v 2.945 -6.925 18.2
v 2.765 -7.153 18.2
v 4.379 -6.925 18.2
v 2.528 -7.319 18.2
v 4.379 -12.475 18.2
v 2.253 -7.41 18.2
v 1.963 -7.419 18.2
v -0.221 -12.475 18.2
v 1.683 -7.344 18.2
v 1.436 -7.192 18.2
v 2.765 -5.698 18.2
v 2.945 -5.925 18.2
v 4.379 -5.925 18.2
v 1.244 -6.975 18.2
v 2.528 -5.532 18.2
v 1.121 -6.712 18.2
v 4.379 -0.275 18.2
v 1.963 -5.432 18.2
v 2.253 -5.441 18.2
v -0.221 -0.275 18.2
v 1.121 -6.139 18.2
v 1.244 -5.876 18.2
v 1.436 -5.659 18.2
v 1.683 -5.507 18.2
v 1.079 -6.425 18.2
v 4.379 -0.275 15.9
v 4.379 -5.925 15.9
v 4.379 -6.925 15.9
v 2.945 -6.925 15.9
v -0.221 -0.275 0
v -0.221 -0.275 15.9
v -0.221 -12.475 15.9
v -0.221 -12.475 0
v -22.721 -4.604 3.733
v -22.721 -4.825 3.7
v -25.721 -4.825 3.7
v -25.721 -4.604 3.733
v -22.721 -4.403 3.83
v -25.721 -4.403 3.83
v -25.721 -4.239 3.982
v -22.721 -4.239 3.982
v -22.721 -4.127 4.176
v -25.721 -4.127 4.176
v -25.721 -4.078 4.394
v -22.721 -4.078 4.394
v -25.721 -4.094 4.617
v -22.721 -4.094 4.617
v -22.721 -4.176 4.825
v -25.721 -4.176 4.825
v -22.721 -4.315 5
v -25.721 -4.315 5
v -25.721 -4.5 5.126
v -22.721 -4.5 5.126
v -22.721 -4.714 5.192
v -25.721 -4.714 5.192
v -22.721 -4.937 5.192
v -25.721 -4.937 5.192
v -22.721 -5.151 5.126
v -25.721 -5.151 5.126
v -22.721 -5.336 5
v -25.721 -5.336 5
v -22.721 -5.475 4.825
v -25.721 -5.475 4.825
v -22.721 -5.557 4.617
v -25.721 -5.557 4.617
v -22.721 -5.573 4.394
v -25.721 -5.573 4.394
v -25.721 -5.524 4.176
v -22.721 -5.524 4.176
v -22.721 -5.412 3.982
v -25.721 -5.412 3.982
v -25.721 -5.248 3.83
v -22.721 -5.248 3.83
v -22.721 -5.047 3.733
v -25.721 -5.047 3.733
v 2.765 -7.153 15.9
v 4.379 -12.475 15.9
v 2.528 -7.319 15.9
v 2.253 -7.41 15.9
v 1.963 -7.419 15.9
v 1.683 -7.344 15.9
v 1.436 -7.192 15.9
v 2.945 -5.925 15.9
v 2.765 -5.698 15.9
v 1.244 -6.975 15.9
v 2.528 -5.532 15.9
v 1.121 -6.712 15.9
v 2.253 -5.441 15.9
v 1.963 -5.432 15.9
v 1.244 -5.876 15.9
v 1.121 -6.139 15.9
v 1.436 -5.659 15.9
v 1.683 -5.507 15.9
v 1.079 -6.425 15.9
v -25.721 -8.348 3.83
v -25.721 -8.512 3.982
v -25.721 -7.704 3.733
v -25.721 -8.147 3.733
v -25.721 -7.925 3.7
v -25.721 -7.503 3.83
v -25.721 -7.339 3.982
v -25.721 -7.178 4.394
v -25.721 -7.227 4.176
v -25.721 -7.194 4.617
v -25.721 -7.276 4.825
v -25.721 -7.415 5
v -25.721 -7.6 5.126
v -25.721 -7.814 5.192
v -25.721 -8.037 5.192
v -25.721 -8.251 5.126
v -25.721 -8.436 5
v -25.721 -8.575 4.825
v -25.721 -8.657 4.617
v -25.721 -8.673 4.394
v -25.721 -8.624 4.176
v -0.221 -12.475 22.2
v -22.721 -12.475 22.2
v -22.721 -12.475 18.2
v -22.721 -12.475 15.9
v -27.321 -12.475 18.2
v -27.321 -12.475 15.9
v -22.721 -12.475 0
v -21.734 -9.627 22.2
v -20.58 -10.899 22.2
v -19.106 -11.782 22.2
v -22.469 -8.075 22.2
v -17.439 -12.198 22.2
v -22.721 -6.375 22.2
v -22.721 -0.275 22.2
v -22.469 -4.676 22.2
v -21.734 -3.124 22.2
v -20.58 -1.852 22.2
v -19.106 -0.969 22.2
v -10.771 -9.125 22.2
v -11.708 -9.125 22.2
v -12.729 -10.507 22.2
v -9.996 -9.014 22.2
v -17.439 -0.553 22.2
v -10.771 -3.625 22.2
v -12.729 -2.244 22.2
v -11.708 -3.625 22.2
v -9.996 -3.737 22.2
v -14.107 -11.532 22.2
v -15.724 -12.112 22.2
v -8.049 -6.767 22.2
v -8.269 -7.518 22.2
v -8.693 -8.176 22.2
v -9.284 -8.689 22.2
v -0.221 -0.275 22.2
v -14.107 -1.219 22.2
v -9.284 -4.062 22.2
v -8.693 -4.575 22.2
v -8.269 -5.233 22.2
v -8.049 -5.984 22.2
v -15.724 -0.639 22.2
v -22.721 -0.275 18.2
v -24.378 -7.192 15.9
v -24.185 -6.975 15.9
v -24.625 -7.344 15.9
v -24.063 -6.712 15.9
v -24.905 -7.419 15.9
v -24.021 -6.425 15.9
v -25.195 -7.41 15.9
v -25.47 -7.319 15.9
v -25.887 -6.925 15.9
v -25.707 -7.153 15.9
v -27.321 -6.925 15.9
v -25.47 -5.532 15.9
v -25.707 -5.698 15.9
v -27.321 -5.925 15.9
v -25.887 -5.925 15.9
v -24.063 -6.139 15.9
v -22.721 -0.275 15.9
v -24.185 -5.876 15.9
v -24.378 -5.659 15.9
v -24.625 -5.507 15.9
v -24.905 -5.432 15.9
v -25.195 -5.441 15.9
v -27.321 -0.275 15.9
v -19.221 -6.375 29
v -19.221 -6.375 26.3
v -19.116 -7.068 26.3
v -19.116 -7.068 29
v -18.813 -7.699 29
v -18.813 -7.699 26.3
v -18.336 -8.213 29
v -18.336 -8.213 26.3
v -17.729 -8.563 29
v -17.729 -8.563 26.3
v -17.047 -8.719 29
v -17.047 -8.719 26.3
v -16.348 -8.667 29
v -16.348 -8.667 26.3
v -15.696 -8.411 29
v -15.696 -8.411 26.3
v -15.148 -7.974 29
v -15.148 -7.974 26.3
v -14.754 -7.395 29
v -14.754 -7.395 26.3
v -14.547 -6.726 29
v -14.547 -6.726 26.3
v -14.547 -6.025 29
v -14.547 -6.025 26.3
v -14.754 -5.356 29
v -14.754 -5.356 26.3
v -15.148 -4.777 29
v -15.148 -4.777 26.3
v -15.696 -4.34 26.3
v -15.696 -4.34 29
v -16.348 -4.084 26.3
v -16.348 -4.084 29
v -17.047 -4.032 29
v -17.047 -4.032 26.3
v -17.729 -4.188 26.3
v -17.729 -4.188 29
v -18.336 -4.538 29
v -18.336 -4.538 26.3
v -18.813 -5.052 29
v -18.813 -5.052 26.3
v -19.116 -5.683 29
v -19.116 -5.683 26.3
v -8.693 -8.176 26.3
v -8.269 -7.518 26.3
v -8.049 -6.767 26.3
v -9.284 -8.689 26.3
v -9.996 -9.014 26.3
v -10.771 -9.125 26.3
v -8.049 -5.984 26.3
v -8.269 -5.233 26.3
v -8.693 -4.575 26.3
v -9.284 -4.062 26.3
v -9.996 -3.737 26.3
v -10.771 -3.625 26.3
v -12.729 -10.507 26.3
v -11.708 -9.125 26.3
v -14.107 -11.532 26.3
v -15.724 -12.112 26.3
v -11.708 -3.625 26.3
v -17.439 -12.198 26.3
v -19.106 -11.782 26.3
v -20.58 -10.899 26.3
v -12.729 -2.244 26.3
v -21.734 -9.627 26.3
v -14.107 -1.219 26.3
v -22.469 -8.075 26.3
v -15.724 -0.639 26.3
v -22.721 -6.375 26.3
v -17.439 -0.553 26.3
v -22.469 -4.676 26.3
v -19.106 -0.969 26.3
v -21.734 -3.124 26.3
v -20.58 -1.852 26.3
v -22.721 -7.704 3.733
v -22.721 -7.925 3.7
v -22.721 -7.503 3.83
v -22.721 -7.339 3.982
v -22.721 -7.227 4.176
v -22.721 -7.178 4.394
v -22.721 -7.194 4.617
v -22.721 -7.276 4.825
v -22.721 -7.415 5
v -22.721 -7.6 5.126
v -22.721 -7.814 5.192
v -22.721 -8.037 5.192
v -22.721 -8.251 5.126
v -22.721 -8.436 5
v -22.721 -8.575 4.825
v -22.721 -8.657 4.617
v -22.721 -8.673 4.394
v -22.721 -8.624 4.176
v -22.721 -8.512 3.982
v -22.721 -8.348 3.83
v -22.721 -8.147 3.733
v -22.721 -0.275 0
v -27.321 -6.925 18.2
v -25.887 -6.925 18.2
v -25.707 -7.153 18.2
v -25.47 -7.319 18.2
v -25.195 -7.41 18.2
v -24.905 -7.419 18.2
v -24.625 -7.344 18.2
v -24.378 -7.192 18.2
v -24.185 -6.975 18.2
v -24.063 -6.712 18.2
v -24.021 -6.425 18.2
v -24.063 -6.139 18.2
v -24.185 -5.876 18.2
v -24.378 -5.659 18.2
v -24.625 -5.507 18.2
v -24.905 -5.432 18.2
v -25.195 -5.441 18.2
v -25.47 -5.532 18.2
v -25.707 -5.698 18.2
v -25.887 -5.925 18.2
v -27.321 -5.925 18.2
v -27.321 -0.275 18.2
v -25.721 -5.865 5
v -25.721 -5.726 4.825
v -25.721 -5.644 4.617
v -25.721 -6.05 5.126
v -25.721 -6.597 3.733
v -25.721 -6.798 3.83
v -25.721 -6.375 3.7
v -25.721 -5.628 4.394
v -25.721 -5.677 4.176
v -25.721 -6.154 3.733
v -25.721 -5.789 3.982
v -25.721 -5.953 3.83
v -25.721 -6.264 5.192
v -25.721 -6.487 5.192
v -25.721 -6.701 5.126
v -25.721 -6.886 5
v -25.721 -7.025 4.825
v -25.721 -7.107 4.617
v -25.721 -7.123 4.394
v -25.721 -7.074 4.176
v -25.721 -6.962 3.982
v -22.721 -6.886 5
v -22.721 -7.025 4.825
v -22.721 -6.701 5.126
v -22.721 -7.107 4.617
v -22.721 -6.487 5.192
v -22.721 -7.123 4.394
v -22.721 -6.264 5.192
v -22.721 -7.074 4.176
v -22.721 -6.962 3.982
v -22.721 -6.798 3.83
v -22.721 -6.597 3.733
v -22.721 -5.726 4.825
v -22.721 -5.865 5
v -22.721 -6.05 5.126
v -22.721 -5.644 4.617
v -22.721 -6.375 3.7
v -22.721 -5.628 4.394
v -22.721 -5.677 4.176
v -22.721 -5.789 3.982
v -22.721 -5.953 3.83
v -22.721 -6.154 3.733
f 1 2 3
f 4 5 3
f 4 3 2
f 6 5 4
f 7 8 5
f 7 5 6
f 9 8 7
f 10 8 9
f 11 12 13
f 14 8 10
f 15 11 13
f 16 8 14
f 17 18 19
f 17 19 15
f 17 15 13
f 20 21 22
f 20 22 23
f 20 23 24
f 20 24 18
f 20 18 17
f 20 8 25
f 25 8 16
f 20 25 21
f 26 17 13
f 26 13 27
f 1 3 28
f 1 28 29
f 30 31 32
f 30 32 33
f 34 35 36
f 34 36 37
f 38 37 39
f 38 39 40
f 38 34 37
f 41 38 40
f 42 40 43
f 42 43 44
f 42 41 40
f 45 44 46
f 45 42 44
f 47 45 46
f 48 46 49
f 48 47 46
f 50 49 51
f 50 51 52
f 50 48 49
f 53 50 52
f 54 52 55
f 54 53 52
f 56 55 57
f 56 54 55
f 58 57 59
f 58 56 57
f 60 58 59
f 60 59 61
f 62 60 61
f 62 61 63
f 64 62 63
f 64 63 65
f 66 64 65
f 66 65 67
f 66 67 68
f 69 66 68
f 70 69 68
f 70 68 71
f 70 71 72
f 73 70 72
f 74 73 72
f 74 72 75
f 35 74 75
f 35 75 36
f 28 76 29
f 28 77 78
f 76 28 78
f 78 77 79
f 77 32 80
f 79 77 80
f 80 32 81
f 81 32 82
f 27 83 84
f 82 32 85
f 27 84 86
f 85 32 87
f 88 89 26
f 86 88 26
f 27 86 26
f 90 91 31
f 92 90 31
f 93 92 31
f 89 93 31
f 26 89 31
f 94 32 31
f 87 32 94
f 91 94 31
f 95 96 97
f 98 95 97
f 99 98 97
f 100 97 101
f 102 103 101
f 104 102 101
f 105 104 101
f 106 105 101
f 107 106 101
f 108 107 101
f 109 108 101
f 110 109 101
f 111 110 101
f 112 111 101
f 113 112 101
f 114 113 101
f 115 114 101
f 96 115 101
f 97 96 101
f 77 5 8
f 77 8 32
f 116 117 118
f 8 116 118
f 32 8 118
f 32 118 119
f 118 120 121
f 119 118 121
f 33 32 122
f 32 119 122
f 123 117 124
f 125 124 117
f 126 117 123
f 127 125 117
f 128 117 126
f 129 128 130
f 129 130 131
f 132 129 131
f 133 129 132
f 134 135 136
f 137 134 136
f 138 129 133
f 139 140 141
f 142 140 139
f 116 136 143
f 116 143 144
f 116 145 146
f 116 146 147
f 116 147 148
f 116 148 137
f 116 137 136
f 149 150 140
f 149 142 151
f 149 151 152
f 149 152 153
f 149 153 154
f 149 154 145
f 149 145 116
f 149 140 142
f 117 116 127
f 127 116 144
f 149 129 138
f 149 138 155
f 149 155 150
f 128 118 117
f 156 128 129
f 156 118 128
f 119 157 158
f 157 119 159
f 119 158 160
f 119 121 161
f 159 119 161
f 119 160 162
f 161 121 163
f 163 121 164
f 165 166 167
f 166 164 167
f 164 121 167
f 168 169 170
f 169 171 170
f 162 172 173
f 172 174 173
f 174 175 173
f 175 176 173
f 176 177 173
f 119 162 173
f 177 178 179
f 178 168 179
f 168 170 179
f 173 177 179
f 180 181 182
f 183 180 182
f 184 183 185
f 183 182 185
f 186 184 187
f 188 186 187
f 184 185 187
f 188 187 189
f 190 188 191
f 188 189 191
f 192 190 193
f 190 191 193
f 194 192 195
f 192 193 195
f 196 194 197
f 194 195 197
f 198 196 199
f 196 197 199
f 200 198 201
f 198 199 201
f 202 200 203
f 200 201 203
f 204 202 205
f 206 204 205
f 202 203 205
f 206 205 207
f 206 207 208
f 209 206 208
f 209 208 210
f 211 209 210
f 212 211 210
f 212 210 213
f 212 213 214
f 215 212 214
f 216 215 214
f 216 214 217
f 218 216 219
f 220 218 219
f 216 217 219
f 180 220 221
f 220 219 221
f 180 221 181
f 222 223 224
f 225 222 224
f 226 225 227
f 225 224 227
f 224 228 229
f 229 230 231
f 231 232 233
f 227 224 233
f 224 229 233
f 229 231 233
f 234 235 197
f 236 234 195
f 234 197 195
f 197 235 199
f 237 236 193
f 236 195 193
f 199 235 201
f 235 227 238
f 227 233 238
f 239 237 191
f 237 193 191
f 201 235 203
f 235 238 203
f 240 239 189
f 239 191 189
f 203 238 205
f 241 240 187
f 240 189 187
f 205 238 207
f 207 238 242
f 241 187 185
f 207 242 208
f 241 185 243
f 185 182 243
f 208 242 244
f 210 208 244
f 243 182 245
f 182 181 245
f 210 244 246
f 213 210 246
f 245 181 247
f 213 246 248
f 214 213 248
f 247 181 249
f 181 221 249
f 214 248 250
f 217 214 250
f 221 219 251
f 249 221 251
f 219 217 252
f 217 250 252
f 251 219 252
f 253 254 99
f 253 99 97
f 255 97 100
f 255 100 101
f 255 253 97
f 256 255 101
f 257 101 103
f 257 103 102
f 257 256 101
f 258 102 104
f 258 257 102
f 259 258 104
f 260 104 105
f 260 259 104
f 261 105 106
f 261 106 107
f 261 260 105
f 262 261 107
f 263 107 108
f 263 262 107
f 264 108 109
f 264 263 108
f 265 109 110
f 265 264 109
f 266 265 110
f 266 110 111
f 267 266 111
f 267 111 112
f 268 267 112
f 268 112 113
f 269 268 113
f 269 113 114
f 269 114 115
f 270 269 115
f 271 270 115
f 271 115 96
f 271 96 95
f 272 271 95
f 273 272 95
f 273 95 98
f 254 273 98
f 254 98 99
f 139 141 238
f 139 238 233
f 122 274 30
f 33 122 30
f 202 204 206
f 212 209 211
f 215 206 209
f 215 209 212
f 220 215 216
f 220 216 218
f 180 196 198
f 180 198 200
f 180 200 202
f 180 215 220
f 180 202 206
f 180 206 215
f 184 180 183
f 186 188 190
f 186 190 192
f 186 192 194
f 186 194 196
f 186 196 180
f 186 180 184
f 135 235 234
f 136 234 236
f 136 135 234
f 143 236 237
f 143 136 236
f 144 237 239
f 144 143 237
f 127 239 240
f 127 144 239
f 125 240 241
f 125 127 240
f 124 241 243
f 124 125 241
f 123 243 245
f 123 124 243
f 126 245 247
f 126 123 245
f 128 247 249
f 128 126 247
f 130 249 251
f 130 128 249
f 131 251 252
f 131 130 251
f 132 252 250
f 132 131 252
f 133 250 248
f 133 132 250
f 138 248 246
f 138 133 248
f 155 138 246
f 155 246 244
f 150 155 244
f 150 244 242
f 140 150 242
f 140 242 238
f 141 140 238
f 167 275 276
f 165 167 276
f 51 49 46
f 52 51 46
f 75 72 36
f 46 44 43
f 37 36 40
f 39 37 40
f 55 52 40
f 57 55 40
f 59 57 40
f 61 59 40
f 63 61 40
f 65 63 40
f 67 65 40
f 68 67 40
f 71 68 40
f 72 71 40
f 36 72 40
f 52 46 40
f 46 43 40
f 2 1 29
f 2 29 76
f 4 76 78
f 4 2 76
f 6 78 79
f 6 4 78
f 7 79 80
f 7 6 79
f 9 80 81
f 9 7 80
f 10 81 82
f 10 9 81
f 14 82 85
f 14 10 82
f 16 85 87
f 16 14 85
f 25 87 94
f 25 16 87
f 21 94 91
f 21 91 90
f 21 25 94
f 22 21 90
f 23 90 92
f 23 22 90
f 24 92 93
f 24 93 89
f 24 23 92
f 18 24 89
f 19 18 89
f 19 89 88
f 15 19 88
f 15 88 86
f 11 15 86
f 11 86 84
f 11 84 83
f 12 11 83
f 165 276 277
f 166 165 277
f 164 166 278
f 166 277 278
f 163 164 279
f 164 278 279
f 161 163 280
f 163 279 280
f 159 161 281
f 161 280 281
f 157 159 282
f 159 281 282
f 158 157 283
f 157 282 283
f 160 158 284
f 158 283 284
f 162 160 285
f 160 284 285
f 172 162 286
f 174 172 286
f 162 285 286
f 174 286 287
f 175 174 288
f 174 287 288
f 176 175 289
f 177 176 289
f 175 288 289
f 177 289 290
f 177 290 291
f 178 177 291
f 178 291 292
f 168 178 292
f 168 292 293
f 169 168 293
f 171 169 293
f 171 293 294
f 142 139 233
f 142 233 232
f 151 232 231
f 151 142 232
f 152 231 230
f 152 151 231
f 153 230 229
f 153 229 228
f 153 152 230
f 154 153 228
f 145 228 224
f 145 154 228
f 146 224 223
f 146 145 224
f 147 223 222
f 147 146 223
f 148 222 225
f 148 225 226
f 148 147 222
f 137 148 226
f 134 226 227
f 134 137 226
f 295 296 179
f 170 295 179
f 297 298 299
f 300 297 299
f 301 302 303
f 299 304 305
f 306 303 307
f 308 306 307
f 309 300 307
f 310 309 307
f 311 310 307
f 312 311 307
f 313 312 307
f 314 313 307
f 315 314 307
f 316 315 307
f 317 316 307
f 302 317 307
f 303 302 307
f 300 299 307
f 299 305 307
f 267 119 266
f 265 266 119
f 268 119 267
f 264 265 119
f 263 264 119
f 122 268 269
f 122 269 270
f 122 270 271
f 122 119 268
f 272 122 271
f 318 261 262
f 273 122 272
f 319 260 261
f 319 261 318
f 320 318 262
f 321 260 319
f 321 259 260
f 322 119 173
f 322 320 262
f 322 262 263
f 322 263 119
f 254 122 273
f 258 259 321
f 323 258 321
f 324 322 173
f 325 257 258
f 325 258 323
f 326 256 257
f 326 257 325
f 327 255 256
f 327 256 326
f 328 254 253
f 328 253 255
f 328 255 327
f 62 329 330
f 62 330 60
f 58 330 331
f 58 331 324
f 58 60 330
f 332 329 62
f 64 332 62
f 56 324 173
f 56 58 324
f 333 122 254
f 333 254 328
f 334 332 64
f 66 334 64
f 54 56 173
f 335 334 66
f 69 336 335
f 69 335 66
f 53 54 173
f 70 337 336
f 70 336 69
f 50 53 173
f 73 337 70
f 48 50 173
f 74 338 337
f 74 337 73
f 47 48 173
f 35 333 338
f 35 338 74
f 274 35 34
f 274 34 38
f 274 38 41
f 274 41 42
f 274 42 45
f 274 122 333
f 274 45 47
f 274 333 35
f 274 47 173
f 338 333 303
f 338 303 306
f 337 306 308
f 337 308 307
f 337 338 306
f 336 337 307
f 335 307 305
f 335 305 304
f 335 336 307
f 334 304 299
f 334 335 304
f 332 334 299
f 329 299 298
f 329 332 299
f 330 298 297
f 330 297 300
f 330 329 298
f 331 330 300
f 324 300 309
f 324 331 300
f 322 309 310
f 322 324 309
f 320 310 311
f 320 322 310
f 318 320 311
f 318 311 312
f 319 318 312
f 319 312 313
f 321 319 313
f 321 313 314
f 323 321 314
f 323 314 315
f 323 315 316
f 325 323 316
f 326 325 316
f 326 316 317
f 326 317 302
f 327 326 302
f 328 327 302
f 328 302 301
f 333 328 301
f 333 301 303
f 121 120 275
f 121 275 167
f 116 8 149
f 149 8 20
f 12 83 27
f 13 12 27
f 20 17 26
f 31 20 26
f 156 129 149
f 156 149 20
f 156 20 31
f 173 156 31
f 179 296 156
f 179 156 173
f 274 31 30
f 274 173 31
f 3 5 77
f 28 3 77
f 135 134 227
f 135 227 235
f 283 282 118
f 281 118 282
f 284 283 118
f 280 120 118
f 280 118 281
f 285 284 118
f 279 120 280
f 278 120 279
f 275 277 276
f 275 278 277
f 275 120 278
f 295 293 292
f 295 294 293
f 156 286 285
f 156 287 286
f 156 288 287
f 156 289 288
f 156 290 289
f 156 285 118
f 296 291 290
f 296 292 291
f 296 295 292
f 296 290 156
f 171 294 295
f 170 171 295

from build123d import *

# Parameters (mm, degrees)
SZKIC1_W                         = 22.5
SZKIC1_H                         = 12.2
DODANIE_WYCI_GNI_CIE1_DEPTH      = 22.2
DODANIE_WYCI_GNI_CIE2_DEPTH      = 4.6
DODANIE_WYCI_GNI_CIE2_DEPTH_BACK = 27.1
SZKIC2_W                         = 2.3
SZKIC2_H                         = 12.2
DODANIE_WYCI_GNI_CIE3_DEPTH      = 4.1
SZKIC8_R                         = 2.35
DODANIE_WYCI_GNI_CIE4_DEPTH      = 2.7
WYTNIJ_WYCI_GNI_CIE2_DEPTH       = 2.3
SZKIC11_R                        = 0.75
DODANIE_WYCI_GNI_CIE8_DEPTH      = 25.5


with BuildPart() as part:
    # Szkic1 → Dodanie-wyciągnięcie1 (new body)
    with BuildSketch(Plane.XY):
        with Locations((-11.470890411, -6.375490196)):
            Rectangle(SZKIC1_W, SZKIC1_H)
    extrude(amount=DODANIE_WYCI_GNI_CIE1_DEPTH)

    # Szkic2 → Dodanie-wyciągnięcie2 (add, two sides: drawn at the far end of the back side and taken through both)
    with BuildSketch(Plane(origin=(-0.220890411, 0, 0), x_dir=(0, 0, -1), z_dir=(1, 0, 0)).offset(-DODANIE_WYCI_GNI_CIE2_DEPTH_BACK)):
        with Locations((-17.05, -6.375490196)):
            Rectangle(SZKIC2_W, SZKIC2_H)
    extrude(amount=DODANIE_WYCI_GNI_CIE2_DEPTH + DODANIE_WYCI_GNI_CIE2_DEPTH_BACK)

    # Szkic3 → Dodanie-wyciągnięcie3 (add)
    with BuildSketch(Plane.XY.offset(22.2)):
        with BuildLine():
            Line((-10.770890411, -9.125490196), (-11.707558154, -9.125490196))
            ThreePointArc((-11.707558154, -9.125490196), (-22.720890411, -6.375490196), (-11.707558154, -3.625490196))
            Line((-11.707558154, -3.625490196), (-10.770890411, -3.625490196))
            ThreePointArc((-10.770890411, -3.625490196), (-8.020890411, -6.375490196), (-10.770890411, -9.125490196))
        make_face()
    extrude(amount=DODANIE_WYCI_GNI_CIE3_DEPTH)

    # Szkic8 → Dodanie-wyciągnięcie4 (add)
    with BuildSketch(Plane.XY.offset(26.3)):
        with Locations(Location((-16.870890411, -6.375490196, 0), (0, 0, 180))):
            Circle(SZKIC8_R)
    extrude(amount=DODANIE_WYCI_GNI_CIE4_DEPTH)

    # Szkic10 → Wytnij-wyciągnięcie2 (cut)
    with BuildSketch(Plane.XY.offset(18.2)):
        with BuildLine():
            Line((-27.320890411, -5.925490196), (-27.320890411, -6.925490196))
            Line((-27.320890411, -6.925490196), (-25.886915815, -6.925490196))
            ThreePointArc((-25.886915815, -6.925490196), (-24.020890411, -6.425490196), (-25.886915815, -5.925490196))
            Line((-25.886915815, -5.925490196), (-27.320890411, -5.925490196))
        make_face()
        with BuildLine():
            Line((4.379109589, -6.925490196), (2.945134993, -6.925490196))
            ThreePointArc((2.945134993, -6.925490196), (1.079109589, -6.425490196), (2.945134993, -5.925490196))
            Line((2.945134993, -5.925490196), (4.379109589, -5.925490196))
            Line((4.379109589, -5.925490196), (4.379109589, -6.925490196))
        make_face()
    extrude(amount=-WYTNIJ_WYCI_GNI_CIE2_DEPTH, mode=Mode.SUBTRACT)

    # Szkic11 → Dodanie-wyciągnięcie8 (add)
    with BuildSketch(Plane(origin=(-0.220890411, 0, 0), x_dir=(0, 0, -1), z_dir=(1, 0, 0))):
        with Locations((-4.45, -6.375490196)):
            Circle(SZKIC11_R)
        with Locations((-4.45, -4.825490196)):
            Circle(SZKIC11_R)
        with Locations((-4.45, -7.925490196)):
            Circle(SZKIC11_R)
    extrude(amount=-DODANIE_WYCI_GNI_CIE8_DEPTH)


solid = part.part
